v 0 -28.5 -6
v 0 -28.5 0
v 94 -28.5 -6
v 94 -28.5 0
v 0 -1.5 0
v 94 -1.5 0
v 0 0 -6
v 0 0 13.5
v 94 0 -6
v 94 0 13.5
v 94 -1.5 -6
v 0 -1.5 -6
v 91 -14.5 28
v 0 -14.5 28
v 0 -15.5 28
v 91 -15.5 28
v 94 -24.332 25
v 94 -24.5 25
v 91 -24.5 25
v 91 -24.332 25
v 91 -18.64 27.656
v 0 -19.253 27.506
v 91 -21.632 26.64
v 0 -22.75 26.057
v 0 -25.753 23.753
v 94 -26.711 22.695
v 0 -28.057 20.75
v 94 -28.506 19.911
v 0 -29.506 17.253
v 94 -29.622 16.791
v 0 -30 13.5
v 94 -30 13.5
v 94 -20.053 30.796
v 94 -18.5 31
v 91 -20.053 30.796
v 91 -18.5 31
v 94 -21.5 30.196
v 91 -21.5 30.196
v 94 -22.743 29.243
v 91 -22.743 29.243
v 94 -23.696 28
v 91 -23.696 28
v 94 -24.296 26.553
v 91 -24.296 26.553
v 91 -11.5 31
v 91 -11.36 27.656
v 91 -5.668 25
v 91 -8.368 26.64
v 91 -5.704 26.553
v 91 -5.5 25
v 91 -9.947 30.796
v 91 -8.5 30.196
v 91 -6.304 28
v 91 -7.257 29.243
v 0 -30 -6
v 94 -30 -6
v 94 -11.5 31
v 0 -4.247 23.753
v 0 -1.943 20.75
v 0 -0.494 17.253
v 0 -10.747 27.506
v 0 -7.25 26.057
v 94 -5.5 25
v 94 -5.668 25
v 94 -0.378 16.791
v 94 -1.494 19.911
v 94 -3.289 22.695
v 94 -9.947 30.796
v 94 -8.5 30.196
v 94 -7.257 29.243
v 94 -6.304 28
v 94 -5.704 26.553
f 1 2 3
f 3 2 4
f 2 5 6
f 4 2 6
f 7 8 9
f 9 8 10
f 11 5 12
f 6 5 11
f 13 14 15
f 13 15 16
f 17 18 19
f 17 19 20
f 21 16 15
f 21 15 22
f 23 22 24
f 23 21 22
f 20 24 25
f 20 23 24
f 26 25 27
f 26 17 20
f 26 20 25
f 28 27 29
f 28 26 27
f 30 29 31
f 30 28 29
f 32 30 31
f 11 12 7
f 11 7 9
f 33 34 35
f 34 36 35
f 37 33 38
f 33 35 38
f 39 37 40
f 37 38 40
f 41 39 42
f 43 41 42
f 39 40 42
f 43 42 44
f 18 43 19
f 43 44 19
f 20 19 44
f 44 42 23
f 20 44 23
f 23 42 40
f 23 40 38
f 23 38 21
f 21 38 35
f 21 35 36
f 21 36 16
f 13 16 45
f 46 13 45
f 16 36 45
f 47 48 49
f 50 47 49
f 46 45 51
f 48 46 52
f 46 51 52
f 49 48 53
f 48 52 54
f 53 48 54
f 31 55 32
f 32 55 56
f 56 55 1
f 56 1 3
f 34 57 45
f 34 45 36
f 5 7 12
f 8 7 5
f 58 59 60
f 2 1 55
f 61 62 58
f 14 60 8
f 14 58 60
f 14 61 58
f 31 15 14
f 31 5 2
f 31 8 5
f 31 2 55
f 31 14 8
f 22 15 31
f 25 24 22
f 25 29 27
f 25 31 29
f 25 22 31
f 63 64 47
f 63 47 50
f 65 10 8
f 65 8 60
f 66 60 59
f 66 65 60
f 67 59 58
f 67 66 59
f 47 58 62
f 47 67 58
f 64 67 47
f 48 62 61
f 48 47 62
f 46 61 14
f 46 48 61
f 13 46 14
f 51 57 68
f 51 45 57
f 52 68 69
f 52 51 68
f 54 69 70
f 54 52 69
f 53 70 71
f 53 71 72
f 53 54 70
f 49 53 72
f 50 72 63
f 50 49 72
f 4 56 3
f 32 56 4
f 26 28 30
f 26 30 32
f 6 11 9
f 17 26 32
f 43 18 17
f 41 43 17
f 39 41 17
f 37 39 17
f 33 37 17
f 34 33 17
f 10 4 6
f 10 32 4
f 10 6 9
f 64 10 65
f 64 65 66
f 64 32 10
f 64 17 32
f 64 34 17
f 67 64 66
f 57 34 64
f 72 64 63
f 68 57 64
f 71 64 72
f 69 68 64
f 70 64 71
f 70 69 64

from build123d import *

# Parameters (mm, degrees)
F0_W     = 94
F0_H     = 30
F1_DEPTH = 28
F2_W     = 94
F2_H     = 1.5
F3_DEPTH = 6
F4_R     = 14.5
F6_DEPTH = 3
F7_R     = 5.99999


# Not quite as in the source:
# - a fillet or chamfer is up to 0.001 mm smaller than in the source, because OpenCascade refuses the exact size


with BuildPart() as f1:
    # F0 (on Top) → F1 (new body)
    with BuildSketch(Plane.XY):
        with Locations((47, -15)):
            Rectangle(F0_W, F0_H)
    extrude(amount=F1_DEPTH)

    # F2 (on face) → F3 (join)
    with BuildSketch(Plane(origin=(0, 0, 0), x_dir=(1, 0, 0), z_dir=(0, 0, -1))):
        with Locations((47, 0.75)):
            Rectangle(F2_W, F2_H)
        with Locations((47, 29.25)):
            Rectangle(F2_W, F2_H)
    extrude(amount=F3_DEPTH)

    # F4
    f4_edges = [f1.edges().sort_by_distance(p)[0] for p in [
        (47, 0, 28),
        (47, -30, 28),
    ]]
    fillet(f4_edges, radius=F4_R)

    # F5 (on face) → F6 (join)
    with BuildSketch(Plane.YZ.offset(94)):
        with BuildLine():
            Line((-5.5, 31), (-24.5, 31))
            Line((-24.5, 31), (-24.5, 25))
            Line((-24.5, 25), (-24.3317608663, 25))
            ThreePointArc((-24.3317608663, 25), (-20.1636895265, 27.2295302177), (-15.5, 28))
            Line((-15.5, 28), (-14.5, 28))
            ThreePointArc((-14.5, 28), (-9.8363104735, 27.2295302177), (-5.6682391337, 25))
            Line((-5.6682391337, 25), (-5.5, 25))
            Line((-5.5, 25), (-5.5, 31))
        make_face()
    extrude(amount=-F6_DEPTH)

    # F7 (radius 6 in the source; OpenCascade refuses exactly that, so slightly less here)
    f7_edges = [f1.edges().sort_by_distance(p)[0] for p in [
        (92.5, -24.5, 31),
        (92.5, -5.5, 31),
    ]]
    fillet(f7_edges, radius=F7_R)


solid = f1.part
